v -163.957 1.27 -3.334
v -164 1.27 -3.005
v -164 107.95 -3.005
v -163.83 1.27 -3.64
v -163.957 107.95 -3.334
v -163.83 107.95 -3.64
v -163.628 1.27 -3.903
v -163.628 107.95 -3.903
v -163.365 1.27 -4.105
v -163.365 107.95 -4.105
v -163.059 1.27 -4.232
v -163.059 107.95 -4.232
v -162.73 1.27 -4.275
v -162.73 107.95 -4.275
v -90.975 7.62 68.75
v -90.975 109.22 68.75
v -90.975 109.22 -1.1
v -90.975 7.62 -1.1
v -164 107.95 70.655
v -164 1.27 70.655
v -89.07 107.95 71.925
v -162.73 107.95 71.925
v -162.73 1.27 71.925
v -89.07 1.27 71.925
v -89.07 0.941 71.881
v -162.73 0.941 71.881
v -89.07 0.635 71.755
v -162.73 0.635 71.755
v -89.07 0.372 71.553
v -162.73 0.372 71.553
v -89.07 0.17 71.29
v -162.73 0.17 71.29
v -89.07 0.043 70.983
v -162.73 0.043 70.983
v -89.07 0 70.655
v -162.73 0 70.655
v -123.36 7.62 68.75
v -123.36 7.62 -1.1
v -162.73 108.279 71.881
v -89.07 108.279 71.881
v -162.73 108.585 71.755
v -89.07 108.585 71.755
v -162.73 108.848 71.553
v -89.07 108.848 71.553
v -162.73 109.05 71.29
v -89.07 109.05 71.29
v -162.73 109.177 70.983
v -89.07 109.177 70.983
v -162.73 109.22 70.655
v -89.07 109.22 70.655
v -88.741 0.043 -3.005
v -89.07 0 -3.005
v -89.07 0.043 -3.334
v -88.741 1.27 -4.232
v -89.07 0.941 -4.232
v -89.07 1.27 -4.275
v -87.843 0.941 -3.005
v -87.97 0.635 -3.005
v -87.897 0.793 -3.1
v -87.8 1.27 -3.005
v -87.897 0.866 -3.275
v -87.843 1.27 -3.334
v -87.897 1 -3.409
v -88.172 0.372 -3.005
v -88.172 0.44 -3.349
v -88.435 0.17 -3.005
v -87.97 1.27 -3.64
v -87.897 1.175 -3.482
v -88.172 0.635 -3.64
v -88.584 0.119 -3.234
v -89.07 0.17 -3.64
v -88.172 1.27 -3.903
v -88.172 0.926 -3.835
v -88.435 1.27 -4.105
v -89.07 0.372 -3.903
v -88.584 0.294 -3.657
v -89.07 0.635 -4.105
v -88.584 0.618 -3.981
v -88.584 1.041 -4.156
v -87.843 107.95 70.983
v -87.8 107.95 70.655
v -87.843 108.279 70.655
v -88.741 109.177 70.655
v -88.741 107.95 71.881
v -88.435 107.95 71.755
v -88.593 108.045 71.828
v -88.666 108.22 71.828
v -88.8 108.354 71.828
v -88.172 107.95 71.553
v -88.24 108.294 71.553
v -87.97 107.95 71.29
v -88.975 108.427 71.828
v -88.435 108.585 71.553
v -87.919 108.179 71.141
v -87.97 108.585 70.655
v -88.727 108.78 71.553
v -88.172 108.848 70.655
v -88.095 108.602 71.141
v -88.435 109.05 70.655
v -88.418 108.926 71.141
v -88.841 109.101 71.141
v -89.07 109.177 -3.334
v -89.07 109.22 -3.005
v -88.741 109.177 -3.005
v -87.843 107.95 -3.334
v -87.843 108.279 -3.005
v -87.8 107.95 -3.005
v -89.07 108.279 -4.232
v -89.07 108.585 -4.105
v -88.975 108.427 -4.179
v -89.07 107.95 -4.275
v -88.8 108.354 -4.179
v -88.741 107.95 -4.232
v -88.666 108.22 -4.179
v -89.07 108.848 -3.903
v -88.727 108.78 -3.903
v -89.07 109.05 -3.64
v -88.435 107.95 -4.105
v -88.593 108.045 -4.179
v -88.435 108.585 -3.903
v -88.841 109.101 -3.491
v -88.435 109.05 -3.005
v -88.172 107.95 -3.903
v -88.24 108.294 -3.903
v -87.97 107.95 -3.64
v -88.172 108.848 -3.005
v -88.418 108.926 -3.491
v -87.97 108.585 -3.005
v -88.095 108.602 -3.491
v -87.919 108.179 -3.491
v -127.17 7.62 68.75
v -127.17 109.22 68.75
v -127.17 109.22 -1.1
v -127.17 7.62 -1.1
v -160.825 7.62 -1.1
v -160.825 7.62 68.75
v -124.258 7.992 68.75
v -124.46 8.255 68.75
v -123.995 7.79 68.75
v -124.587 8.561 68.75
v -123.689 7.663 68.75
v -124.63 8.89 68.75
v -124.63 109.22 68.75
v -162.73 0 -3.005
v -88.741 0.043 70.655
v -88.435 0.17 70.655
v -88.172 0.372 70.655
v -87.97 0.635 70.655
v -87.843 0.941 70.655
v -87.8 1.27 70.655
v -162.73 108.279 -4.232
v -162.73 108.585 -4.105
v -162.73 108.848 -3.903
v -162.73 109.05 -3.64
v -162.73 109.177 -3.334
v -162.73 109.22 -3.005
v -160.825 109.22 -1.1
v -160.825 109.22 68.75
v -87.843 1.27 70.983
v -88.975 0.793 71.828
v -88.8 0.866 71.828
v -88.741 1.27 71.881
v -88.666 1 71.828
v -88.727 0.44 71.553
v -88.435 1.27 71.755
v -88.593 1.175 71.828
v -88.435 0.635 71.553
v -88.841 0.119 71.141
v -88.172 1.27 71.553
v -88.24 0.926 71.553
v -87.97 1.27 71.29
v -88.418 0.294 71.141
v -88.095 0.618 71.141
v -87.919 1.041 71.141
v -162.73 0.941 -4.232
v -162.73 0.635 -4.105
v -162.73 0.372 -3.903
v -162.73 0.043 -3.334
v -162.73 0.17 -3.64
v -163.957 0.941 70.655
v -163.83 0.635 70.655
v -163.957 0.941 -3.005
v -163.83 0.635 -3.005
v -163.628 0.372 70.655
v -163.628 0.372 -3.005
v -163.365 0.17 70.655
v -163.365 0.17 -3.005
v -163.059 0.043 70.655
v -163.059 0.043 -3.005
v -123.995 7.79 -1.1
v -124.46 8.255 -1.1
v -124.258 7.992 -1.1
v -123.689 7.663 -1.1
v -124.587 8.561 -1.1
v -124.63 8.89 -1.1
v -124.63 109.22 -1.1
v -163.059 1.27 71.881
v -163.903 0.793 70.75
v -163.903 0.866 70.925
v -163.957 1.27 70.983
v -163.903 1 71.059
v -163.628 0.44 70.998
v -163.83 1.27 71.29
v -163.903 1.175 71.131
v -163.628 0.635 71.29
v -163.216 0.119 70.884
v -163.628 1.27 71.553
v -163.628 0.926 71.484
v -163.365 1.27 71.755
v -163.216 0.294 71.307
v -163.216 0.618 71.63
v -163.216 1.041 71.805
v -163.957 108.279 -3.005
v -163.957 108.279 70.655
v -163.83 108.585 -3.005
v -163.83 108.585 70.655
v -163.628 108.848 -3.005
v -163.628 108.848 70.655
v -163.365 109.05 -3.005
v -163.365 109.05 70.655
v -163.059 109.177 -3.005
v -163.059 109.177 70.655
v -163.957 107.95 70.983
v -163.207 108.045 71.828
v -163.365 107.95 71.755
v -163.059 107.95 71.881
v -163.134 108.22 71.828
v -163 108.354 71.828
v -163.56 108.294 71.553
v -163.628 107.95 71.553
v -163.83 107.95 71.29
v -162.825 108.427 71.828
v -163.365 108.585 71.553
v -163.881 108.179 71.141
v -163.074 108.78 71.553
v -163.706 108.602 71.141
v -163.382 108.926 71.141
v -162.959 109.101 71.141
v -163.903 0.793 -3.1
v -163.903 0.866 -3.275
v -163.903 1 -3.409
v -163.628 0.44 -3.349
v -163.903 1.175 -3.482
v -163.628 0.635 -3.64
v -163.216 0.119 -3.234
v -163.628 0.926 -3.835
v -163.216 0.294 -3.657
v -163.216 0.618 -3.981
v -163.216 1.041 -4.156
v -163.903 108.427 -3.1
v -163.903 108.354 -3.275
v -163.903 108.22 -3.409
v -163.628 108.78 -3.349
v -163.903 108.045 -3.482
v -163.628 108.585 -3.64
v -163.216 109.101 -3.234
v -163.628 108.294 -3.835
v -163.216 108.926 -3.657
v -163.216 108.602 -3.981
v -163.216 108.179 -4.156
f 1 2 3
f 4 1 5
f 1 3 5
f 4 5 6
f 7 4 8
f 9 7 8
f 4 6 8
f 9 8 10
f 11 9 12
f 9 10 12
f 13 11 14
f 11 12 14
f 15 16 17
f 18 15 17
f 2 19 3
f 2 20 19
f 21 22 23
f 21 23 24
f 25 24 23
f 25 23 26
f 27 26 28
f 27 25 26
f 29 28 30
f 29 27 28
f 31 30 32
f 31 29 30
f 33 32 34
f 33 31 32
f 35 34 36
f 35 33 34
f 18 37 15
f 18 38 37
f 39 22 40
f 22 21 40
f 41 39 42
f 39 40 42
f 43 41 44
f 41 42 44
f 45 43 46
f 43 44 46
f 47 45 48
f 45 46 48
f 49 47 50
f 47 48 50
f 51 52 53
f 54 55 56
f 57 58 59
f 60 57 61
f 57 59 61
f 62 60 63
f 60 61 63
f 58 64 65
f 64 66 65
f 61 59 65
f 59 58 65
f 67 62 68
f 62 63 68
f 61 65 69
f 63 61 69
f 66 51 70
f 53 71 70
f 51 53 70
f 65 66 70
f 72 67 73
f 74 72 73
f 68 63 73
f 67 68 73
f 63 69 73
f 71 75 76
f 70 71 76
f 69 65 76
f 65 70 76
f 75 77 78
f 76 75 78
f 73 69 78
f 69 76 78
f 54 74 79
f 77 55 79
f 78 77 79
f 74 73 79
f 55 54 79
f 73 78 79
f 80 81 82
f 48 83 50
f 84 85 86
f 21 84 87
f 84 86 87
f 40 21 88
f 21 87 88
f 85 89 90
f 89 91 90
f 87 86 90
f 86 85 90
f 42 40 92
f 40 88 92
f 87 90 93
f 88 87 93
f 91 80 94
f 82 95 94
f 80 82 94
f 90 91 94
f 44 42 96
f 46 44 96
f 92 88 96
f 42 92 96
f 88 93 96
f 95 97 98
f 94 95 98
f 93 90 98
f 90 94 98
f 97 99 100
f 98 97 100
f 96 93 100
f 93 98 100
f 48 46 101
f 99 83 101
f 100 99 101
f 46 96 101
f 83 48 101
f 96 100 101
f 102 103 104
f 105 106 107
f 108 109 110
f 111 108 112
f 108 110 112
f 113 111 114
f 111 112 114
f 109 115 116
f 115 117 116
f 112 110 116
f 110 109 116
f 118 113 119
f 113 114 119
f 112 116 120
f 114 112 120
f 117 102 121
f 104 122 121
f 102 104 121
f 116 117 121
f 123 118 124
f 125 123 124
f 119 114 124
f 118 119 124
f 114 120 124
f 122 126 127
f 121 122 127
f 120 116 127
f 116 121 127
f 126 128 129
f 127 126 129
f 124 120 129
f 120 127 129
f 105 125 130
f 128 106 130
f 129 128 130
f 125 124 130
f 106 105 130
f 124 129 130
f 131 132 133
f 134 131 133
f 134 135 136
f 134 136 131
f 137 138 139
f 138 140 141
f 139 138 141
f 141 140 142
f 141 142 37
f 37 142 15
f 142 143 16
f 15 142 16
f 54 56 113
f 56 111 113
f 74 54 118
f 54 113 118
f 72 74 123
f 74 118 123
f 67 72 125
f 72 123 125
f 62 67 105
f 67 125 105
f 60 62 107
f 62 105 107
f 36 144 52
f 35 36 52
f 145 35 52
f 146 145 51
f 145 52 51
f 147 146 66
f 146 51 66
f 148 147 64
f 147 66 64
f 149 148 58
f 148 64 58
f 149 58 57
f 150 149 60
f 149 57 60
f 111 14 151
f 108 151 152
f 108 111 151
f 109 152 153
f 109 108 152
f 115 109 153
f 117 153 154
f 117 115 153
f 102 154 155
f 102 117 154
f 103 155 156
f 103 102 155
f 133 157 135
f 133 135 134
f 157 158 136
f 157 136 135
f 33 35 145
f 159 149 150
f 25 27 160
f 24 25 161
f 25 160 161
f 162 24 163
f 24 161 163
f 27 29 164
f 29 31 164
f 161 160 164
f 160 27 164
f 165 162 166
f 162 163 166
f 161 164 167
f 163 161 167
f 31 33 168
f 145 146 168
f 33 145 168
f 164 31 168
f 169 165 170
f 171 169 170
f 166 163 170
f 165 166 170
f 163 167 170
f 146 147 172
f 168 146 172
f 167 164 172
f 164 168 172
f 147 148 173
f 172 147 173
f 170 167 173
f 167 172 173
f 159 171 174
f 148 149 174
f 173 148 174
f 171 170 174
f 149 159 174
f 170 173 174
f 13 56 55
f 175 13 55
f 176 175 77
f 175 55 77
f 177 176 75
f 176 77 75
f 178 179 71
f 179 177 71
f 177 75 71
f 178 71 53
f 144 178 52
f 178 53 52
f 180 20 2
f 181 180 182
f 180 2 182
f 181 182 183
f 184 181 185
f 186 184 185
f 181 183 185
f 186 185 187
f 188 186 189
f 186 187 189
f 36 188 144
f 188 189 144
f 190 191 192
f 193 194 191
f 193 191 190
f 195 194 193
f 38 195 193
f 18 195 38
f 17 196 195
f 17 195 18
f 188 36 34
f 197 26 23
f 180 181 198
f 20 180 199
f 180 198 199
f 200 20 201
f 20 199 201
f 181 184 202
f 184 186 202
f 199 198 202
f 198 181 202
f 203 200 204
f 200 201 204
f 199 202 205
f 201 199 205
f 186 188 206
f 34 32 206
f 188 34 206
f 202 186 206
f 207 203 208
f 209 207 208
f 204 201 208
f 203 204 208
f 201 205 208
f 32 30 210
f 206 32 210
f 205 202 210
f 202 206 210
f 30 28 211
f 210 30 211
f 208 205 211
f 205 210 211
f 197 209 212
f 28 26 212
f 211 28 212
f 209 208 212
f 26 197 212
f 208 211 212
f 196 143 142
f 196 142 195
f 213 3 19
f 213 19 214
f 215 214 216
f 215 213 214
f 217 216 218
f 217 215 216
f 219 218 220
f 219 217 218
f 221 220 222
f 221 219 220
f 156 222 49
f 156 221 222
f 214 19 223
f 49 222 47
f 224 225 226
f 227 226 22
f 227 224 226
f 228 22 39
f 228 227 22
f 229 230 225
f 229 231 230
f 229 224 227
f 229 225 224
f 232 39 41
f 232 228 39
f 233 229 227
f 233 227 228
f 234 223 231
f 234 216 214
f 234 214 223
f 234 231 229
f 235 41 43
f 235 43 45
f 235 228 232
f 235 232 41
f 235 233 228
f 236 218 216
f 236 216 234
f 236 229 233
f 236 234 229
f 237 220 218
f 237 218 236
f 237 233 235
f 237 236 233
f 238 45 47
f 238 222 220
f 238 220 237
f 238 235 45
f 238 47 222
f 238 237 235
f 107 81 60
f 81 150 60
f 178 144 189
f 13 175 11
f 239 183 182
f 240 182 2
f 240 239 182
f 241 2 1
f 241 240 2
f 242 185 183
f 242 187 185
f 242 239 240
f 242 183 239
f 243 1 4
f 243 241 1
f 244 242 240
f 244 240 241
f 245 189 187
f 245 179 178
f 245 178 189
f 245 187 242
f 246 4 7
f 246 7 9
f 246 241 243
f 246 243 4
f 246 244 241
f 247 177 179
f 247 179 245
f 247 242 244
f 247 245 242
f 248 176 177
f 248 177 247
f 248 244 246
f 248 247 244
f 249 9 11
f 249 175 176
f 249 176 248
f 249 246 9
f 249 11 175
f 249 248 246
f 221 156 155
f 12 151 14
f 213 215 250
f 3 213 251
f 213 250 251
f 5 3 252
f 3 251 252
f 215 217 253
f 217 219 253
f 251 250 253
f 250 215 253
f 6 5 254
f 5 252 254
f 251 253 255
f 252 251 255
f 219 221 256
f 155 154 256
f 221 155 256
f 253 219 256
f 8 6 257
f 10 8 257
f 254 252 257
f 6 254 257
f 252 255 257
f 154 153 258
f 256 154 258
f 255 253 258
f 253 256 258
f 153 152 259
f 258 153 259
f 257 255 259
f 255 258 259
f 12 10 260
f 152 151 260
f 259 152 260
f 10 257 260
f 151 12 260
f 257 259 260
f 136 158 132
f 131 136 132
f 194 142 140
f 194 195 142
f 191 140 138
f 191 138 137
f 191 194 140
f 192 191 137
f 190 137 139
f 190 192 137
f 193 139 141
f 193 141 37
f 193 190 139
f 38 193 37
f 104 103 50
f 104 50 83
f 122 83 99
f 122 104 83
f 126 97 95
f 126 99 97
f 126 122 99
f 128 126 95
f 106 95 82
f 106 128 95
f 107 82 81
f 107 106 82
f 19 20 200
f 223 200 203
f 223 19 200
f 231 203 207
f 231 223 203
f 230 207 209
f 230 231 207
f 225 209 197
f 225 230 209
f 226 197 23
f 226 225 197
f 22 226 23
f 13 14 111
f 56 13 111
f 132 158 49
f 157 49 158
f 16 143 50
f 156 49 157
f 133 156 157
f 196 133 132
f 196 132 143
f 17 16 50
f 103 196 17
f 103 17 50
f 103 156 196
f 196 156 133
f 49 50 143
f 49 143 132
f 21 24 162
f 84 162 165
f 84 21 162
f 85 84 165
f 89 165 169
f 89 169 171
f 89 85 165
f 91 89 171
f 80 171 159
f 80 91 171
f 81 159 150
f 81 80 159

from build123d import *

# Parameters (mm, degrees)
SKETCH3_W           = 76.2
SKETCH3_H           = 76.2
BOSS_EXTRUDE1_DEPTH = 109.22
SKETCH4_W           = 33.655
SKETCH4_H           = 69.85
CUT_EXTRUDE2_DEPTH  = 101.6
FILLET10_R          = 1.27


with BuildPart() as part:
    # Sketch3 → Boss-Extrude1 (new body)
    with BuildSketch(Plane(origin=(0, 0, 0), x_dir=(1, 0, 0), z_dir=(0, 1, 0))):
        with Locations((-125.900159602, -33.824710809)):
            Rectangle(SKETCH3_W, SKETCH3_H)
    extrude(amount=BOSS_EXTRUDE1_DEPTH)

    # Sketch4 → Cut-Extrude2 (cut)
    with BuildSketch(Plane(origin=(0, 109.22, 0), x_dir=(1, 0, 0), z_dir=(0, 1, 0))):
        with Locations((-143.997659602, -33.824710809)):
            Rectangle(SKETCH4_W, SKETCH4_H)
        with Locations((-107.802659602, -33.824710809)):
            Rectangle(SKETCH4_W, SKETCH4_H)
    extrude(amount=-CUT_EXTRUDE2_DEPTH, mode=Mode.SUBTRACT)

    # Fillet10
    fillet10_edges = [part.edges().sort_by_distance(p)[0] for p in [
        (-87.800159602, 109.22, 33.824710809),
        (-125.900159602, 109.22, -4.275289191),
        (-124.630159602, 7.62, 33.824710809),
        (-164.000159602, 109.22, 33.824710809),
        (-125.900159602, 0, -4.275289191),
        (-87.800159602, 0, 33.824710809),
        (-125.900159602, 0, 71.924710809),
        (-164.000159602, 0, 33.824710809),
        (-164.000159602, 54.61, -4.275289191),
        (-87.800159602, 54.61, -4.275289191),
        (-87.800159602, 54.61, 71.924710809),
        (-164.000159602, 54.61, 71.924710809),
        (-125.900159602, 109.22, 71.924710809),
    ]]
    fillet(fillet10_edges, radius=FILLET10_R)


solid = part.part
